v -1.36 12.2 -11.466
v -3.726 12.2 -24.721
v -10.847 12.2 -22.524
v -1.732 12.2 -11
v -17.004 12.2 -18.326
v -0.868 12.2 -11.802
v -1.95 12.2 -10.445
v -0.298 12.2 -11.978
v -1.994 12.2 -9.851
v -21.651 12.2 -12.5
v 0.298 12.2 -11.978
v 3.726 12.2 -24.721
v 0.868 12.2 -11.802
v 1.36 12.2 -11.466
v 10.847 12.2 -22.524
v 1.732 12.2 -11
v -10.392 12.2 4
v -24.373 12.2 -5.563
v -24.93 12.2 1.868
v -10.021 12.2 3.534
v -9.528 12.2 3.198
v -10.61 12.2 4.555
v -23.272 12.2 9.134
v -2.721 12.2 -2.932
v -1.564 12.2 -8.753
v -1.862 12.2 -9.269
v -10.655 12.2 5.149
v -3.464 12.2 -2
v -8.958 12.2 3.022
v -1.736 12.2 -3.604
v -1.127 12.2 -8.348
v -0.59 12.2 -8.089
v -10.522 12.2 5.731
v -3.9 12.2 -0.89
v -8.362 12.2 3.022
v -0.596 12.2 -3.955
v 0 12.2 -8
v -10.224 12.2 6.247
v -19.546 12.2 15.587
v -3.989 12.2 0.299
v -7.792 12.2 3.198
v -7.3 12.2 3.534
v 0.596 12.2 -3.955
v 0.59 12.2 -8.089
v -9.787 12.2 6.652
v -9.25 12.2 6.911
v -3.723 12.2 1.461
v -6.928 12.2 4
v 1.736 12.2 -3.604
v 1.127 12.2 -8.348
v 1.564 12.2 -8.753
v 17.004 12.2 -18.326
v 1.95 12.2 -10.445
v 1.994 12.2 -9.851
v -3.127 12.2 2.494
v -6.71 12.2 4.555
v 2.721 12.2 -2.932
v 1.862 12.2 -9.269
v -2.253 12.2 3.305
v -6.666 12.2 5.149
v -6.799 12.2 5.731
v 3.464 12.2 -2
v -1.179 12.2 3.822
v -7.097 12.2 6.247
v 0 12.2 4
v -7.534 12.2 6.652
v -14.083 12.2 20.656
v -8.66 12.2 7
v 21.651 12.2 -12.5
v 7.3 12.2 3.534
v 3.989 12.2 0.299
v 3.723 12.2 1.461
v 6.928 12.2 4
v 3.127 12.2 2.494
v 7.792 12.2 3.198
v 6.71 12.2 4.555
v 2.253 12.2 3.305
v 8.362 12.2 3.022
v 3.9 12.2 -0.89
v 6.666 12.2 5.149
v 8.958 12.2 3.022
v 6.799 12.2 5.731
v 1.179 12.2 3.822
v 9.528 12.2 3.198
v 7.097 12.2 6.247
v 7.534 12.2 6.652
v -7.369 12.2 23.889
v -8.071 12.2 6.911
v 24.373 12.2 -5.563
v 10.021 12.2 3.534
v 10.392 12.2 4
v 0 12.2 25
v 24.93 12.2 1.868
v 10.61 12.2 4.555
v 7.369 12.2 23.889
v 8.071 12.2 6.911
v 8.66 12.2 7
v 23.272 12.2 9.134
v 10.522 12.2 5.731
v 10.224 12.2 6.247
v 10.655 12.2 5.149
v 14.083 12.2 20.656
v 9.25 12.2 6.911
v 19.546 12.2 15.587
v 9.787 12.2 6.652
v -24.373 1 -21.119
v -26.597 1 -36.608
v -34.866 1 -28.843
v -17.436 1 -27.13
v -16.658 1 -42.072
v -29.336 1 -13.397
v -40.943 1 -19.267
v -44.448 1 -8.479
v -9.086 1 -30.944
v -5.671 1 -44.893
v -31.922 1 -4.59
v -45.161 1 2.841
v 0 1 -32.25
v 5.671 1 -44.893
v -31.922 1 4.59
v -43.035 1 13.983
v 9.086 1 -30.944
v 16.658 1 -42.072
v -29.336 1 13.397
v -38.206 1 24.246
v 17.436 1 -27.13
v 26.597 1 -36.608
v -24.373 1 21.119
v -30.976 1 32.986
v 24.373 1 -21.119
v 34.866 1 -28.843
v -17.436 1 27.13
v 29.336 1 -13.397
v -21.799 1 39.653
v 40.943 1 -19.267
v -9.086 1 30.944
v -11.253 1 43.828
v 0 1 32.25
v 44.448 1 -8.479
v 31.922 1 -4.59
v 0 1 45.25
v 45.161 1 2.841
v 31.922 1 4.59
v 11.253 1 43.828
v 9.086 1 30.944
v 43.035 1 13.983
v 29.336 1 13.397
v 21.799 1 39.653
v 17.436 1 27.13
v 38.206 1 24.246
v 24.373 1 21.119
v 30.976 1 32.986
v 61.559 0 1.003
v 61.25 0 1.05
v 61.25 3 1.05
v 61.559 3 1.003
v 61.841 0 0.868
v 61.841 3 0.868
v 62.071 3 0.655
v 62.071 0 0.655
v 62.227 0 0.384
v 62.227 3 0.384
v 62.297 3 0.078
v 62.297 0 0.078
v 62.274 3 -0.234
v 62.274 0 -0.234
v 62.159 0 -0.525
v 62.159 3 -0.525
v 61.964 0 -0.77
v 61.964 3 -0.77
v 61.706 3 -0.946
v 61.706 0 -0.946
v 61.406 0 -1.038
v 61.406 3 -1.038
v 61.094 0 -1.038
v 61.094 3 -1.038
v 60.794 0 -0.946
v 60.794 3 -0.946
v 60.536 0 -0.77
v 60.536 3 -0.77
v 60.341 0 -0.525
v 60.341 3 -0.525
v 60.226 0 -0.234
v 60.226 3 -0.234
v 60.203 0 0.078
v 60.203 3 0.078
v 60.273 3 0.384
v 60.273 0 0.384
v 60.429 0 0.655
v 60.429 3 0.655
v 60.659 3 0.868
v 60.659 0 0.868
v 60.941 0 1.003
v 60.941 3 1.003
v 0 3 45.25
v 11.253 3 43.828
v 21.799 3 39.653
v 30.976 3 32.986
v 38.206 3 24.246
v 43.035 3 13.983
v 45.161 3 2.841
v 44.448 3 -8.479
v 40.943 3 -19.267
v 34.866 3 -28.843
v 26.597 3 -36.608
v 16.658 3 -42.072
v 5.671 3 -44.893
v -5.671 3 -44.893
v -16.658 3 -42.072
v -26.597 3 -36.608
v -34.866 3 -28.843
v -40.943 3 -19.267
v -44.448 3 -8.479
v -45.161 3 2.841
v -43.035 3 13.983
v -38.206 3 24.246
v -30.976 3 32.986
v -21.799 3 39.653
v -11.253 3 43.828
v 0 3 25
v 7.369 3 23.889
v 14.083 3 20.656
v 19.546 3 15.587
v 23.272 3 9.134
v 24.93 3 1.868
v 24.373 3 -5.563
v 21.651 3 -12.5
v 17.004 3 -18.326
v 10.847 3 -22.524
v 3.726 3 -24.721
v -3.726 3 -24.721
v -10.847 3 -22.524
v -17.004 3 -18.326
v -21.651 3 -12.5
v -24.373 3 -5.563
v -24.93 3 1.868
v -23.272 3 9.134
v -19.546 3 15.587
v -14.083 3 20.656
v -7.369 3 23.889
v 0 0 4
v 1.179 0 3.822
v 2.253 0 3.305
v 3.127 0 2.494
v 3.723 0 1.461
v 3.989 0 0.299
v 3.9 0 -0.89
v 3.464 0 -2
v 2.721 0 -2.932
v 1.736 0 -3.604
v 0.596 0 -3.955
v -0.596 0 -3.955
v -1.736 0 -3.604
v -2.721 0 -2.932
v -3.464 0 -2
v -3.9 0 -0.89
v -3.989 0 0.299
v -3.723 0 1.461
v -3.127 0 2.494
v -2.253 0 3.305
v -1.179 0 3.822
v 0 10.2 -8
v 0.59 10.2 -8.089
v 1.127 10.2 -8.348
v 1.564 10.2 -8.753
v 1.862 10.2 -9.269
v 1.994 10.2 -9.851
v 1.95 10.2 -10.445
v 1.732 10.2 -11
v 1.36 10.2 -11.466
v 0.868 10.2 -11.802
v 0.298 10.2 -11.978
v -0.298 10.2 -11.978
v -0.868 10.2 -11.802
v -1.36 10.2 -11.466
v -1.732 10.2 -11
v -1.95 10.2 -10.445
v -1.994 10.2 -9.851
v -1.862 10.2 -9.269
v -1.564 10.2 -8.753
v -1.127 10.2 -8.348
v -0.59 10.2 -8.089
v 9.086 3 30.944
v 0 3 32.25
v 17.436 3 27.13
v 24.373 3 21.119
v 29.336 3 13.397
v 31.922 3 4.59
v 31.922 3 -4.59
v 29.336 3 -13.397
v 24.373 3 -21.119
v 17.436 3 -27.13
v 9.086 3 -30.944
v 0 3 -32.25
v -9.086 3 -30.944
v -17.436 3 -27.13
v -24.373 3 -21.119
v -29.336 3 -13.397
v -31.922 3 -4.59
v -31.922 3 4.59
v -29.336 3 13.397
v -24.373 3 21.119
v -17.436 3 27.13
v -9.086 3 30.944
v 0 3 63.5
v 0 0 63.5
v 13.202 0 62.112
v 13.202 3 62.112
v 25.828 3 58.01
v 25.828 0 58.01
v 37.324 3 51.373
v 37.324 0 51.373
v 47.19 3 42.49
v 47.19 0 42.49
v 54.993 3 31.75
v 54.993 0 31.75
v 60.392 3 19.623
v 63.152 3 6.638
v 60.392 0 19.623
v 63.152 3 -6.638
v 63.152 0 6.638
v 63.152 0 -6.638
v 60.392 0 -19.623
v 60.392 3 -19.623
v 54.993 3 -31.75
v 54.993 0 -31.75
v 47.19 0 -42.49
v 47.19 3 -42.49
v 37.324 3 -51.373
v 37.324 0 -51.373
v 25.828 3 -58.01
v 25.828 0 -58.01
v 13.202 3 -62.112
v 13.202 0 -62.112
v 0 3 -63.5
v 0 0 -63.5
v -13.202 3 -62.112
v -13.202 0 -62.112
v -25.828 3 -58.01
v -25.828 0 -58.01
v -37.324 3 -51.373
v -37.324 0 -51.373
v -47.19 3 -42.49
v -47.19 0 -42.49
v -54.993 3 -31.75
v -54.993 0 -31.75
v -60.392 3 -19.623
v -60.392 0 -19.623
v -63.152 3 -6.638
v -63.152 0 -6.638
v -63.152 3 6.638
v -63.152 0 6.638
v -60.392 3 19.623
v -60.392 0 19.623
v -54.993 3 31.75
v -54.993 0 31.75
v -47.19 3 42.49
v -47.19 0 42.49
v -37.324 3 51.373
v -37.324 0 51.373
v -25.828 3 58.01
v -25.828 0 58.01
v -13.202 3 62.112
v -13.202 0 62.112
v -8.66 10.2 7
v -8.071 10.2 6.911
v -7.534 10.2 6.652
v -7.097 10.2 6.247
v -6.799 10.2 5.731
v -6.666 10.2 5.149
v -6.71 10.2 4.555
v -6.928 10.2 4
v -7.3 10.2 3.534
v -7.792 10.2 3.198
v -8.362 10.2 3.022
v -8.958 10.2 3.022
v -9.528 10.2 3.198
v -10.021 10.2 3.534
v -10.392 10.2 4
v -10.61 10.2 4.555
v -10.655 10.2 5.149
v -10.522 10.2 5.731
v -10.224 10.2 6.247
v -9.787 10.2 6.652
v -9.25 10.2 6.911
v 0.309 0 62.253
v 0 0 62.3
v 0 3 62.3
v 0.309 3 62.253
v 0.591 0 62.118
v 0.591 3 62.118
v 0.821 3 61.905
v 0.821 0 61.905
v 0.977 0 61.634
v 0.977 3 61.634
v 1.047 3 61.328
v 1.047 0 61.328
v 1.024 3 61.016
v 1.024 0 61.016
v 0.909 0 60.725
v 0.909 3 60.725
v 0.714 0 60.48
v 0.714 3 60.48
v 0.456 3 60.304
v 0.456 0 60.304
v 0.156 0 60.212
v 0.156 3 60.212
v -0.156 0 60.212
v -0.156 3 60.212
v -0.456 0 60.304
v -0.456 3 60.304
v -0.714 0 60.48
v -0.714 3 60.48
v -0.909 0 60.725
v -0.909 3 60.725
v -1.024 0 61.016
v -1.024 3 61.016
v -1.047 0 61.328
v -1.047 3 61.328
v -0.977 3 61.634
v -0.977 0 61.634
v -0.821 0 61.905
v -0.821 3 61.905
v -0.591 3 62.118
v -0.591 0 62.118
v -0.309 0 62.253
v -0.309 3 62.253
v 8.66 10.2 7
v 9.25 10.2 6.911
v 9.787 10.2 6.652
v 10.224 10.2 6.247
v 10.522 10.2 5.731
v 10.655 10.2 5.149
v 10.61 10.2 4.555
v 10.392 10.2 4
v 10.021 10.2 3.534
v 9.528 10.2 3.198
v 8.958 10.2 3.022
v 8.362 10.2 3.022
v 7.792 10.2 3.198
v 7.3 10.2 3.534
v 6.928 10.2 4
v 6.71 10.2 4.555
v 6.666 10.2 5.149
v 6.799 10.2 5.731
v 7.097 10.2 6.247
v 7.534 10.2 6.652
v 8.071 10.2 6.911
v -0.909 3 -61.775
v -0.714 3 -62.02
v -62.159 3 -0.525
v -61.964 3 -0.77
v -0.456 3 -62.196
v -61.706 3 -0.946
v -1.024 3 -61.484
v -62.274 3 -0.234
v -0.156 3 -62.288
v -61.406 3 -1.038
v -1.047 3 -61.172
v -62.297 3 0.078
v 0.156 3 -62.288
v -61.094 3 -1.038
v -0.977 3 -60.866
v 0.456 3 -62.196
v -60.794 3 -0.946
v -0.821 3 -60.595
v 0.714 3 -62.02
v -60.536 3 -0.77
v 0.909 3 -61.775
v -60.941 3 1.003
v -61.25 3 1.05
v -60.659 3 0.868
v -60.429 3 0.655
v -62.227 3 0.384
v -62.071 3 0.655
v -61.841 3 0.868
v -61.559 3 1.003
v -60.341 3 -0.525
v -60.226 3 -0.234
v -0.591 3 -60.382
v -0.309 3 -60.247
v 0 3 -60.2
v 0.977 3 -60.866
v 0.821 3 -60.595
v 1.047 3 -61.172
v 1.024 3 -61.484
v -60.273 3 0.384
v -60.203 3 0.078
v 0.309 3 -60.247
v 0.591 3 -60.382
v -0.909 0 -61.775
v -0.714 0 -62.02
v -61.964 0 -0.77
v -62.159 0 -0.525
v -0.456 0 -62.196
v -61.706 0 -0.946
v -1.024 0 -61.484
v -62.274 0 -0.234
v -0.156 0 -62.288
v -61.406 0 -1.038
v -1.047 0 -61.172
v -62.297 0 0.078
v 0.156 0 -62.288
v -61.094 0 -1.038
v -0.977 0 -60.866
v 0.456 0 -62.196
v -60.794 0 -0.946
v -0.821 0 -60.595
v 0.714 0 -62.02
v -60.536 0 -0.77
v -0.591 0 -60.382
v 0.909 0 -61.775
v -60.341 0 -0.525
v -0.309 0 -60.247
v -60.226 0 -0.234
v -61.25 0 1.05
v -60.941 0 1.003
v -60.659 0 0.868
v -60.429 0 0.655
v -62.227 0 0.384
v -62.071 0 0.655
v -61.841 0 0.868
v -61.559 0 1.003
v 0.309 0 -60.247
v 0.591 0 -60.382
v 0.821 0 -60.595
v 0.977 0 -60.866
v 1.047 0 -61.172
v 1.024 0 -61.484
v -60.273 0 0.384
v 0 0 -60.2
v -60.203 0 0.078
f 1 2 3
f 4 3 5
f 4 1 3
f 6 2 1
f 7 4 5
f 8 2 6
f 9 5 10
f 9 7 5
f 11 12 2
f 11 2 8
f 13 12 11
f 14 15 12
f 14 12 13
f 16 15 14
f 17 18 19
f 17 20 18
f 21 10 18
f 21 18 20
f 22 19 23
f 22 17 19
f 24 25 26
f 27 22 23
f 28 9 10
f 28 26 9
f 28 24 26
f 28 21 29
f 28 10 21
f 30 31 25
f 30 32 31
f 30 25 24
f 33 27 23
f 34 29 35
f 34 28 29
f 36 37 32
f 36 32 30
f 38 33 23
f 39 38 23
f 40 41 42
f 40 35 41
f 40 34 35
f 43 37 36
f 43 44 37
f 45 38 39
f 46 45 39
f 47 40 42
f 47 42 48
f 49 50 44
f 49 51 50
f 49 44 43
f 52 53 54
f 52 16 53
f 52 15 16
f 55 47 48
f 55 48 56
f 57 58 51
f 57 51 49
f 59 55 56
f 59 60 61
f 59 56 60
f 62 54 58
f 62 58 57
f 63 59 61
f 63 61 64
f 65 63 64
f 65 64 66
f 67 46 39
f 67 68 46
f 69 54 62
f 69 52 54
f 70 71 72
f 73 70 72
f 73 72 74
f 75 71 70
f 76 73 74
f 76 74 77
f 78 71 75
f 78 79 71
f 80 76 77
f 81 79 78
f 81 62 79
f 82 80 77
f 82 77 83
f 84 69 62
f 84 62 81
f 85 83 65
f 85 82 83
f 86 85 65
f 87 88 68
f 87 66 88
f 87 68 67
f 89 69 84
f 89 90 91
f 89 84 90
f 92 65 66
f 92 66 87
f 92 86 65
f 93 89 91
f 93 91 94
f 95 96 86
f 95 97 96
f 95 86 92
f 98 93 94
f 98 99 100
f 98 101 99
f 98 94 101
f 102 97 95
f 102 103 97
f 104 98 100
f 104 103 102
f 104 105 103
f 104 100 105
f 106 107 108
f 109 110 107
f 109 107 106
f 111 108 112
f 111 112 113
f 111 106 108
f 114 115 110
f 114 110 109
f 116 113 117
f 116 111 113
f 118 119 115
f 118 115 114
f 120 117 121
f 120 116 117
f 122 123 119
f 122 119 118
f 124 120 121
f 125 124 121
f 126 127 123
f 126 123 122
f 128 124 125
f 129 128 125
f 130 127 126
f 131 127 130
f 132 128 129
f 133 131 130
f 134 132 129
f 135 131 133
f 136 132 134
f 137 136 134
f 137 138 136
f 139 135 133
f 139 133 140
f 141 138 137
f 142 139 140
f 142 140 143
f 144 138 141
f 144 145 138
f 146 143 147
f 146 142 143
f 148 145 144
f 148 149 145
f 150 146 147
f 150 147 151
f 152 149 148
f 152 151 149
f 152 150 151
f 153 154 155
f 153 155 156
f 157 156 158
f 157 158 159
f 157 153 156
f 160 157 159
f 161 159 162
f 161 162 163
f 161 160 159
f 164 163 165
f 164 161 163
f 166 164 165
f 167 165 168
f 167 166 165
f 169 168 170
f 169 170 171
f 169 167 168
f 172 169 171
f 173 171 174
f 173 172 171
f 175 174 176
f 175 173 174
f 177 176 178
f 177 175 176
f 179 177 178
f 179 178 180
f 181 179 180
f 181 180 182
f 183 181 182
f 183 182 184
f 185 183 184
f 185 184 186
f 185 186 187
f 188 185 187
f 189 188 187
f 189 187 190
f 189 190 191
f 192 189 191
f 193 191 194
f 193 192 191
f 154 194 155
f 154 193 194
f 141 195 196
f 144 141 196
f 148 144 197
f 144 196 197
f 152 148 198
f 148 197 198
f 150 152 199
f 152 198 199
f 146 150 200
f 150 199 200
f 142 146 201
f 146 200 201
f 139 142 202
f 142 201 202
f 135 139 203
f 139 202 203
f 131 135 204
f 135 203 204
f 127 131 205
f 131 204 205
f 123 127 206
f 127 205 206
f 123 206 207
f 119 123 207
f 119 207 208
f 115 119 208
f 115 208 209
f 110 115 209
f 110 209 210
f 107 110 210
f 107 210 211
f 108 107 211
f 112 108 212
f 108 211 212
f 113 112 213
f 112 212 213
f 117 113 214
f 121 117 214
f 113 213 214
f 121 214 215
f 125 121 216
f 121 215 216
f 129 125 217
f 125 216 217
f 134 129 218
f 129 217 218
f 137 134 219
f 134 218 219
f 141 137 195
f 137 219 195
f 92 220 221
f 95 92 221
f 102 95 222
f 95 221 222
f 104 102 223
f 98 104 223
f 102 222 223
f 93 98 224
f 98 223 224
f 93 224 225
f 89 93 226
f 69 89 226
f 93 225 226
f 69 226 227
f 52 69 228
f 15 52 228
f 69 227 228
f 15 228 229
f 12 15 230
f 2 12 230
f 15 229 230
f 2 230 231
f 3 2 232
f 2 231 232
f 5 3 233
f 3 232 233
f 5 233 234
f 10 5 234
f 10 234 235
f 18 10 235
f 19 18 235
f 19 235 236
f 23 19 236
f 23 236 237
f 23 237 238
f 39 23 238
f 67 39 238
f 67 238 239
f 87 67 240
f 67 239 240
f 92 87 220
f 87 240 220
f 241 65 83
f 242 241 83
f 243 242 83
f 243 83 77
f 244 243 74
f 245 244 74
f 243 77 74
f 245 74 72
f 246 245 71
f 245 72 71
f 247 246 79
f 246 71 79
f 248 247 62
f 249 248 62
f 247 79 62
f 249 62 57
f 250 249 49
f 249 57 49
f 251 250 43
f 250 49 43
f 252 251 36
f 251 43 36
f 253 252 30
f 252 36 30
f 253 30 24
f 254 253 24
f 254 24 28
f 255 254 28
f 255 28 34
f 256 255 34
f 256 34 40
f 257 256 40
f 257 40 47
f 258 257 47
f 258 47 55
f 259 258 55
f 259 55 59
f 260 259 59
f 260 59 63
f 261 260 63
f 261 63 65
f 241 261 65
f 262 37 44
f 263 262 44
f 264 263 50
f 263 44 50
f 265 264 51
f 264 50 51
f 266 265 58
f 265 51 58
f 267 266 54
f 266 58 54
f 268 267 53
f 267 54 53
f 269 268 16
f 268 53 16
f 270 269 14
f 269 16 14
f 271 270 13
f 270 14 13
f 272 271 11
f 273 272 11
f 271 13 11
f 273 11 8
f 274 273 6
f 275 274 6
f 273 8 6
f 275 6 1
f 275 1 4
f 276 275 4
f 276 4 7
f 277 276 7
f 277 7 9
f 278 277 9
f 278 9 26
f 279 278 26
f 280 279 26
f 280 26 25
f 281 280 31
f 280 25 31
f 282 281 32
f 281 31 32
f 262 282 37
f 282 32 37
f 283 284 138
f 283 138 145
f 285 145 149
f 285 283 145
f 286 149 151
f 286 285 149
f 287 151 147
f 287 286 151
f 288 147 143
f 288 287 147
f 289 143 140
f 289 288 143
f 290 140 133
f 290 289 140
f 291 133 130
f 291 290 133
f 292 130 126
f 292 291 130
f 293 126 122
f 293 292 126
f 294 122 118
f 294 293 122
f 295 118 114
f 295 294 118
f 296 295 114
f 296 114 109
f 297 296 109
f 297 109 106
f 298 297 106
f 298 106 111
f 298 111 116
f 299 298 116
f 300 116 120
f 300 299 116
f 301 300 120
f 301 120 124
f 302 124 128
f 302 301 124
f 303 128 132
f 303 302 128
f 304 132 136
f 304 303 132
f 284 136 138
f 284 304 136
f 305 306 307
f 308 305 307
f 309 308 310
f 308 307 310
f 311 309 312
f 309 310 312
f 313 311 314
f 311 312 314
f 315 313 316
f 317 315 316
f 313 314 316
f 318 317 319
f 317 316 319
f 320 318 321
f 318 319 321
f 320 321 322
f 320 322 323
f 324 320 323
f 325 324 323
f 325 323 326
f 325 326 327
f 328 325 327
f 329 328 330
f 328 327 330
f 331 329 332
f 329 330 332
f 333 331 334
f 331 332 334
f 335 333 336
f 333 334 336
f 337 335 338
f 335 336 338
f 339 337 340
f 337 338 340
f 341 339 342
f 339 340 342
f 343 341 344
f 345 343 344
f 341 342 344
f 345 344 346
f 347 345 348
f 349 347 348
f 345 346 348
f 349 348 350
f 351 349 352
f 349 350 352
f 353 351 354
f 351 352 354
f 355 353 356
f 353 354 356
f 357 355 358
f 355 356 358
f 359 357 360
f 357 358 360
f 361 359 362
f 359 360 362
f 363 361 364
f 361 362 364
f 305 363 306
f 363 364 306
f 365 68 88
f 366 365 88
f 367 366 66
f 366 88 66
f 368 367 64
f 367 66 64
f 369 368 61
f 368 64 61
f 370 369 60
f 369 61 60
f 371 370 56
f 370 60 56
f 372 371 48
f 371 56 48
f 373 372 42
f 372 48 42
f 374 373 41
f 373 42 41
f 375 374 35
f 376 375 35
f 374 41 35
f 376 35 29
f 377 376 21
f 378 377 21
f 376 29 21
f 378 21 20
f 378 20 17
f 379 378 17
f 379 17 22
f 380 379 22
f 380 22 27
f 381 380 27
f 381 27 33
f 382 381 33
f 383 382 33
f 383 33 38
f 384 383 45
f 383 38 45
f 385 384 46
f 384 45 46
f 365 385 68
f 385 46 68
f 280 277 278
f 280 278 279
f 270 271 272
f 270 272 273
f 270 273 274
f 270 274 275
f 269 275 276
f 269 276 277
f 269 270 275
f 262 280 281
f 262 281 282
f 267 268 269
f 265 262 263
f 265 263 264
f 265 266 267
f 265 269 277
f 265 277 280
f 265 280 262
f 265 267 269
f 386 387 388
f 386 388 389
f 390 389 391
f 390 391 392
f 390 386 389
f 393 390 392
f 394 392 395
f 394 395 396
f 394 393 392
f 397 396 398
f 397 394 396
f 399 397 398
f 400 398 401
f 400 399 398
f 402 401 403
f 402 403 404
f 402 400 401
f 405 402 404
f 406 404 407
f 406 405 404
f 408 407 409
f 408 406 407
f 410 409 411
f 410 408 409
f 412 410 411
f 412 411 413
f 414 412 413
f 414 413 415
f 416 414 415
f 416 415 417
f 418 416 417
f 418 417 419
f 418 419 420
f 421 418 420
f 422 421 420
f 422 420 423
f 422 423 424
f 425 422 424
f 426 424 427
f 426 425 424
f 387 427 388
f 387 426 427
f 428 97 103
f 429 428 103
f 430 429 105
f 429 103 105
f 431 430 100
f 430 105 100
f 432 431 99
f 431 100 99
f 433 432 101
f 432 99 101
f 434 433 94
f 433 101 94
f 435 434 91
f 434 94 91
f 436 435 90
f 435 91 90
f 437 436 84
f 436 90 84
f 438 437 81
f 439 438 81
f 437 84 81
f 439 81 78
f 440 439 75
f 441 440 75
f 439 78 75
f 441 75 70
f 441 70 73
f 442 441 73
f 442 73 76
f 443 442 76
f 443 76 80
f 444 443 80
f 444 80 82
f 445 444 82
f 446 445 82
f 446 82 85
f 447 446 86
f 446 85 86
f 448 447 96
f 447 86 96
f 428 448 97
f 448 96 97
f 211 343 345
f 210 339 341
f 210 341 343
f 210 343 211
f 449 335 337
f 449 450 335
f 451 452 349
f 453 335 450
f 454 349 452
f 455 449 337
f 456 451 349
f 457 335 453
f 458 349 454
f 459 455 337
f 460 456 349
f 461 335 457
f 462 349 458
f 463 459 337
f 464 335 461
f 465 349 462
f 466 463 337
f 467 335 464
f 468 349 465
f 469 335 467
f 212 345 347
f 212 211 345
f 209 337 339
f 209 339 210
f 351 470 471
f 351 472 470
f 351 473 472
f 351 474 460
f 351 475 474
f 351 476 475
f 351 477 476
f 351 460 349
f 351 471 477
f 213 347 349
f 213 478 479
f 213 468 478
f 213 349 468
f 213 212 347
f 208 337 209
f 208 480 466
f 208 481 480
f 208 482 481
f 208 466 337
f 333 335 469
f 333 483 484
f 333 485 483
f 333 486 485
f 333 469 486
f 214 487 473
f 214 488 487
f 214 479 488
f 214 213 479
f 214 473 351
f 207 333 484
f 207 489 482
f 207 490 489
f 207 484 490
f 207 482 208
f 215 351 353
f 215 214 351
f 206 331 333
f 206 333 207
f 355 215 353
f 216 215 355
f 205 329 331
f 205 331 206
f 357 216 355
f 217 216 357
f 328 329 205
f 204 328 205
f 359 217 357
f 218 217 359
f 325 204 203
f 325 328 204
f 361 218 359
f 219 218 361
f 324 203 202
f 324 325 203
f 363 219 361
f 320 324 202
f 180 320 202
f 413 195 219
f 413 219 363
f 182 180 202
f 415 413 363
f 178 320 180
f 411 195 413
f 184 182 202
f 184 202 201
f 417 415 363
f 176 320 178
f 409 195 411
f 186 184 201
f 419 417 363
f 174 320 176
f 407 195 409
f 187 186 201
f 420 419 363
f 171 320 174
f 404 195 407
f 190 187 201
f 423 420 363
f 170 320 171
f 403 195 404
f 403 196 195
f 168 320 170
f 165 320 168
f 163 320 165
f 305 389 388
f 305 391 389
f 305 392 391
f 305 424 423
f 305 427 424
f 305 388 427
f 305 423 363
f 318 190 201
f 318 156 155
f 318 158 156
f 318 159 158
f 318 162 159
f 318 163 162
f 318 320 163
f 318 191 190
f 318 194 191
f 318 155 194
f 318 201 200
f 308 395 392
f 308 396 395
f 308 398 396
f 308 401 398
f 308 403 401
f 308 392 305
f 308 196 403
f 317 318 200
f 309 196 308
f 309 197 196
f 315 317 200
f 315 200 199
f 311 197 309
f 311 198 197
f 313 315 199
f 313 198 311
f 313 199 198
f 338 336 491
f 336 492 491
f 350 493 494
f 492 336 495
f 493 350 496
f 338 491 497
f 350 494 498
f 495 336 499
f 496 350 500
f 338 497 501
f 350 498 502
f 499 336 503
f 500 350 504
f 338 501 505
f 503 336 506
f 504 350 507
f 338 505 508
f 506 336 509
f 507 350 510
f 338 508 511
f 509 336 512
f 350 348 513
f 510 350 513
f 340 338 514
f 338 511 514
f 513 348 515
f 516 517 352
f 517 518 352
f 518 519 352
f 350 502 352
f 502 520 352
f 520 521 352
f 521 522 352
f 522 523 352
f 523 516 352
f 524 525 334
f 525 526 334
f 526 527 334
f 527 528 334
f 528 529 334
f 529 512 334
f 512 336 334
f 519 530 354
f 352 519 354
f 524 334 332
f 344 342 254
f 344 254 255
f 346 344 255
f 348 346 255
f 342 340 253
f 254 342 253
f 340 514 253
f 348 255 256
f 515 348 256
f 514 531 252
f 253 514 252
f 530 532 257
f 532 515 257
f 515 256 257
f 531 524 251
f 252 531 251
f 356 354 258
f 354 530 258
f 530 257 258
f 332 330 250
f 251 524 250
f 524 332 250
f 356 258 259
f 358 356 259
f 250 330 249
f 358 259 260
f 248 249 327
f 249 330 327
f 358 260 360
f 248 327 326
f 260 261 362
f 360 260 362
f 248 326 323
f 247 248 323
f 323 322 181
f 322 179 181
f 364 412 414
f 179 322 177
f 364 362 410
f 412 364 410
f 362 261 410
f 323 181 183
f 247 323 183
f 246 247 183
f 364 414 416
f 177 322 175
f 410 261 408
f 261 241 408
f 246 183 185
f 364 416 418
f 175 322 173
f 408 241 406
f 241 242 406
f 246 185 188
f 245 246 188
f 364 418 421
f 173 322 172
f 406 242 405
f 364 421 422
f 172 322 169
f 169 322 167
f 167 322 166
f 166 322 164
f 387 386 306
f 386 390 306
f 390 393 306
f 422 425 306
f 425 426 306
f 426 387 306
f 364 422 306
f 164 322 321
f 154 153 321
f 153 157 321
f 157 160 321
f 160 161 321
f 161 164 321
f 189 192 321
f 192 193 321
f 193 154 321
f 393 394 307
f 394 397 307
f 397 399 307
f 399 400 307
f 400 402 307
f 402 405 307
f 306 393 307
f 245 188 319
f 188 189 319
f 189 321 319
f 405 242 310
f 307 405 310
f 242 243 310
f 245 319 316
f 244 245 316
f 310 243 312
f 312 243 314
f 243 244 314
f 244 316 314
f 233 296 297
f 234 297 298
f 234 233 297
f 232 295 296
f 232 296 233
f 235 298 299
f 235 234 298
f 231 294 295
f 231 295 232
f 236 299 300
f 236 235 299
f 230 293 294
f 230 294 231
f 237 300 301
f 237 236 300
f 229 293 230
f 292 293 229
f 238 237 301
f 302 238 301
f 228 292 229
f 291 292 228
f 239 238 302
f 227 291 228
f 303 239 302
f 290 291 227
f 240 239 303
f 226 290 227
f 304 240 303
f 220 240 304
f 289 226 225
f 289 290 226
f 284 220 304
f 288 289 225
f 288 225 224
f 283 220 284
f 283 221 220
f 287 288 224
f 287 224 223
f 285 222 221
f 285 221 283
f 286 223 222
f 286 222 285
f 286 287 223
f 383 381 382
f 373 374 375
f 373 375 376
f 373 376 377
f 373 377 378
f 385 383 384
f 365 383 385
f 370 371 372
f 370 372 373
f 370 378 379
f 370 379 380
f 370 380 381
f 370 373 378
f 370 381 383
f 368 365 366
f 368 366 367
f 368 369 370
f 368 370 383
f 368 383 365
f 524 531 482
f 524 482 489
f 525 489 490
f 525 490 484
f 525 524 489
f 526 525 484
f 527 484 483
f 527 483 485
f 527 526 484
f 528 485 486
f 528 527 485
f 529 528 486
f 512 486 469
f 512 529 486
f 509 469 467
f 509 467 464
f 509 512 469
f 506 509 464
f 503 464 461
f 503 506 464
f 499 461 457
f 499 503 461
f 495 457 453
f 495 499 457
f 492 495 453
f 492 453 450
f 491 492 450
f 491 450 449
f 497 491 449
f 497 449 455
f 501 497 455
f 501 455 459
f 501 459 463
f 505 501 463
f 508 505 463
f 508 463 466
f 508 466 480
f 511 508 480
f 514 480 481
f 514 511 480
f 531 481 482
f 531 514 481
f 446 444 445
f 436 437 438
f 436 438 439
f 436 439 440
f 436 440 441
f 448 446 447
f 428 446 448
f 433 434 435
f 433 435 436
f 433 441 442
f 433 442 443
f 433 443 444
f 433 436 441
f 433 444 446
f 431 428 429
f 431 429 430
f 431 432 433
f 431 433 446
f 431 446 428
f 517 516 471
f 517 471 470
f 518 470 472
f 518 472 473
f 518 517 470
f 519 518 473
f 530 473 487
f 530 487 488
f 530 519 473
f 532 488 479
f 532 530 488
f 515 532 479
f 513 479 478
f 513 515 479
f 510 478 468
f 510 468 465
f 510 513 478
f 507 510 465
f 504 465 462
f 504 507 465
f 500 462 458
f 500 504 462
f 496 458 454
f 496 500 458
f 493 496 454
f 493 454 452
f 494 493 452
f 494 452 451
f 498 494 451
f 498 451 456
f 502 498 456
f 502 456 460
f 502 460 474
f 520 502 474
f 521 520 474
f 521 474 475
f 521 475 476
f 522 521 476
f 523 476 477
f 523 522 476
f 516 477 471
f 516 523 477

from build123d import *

# Parameters (mm, degrees)
SKETCH1_R           = 63.5
SKETCH1_R_2         = 1.05
BOSS_EXTRUDE1_DEPTH = 3
SKETCH2_R           = 45.25
SKETCH2_R_2         = 32.25
CUT_EXTRUDE1_DEPTH  = 2
SKETCH4_R           = 25
BOSS_EXTRUDE2_DEPTH = 9.2
SKETCH5_R           = 2
CUT_EXTRUDE2_DEPTH  = 2
SKETCH6_R           = 4
CUT_EXTRUDE3_DEPTH  = 91.627479276


with BuildPart() as part:
    # Sketch1 → Boss-Extrude1 (new body)
    with BuildSketch(Plane(origin=(0, 0, 0), x_dir=(1, 0, 0), z_dir=(0, 1, 0))):
        with Locations(Location((0, 0, 0), (0, 0, 270))):
            Circle(SKETCH1_R)
        with Locations(Location((0, 61.25, 0), (0, 0, 270))):
            Circle(SKETCH1_R_2, mode=Mode.SUBTRACT)
        with Locations(Location((61.25, 0, 0), (0, 0, 270))):
            Circle(SKETCH1_R_2, mode=Mode.SUBTRACT)
        with Locations(Location((0, -61.25, 0), (0, 0, 270))):
            Circle(SKETCH1_R_2, mode=Mode.SUBTRACT)
        with Locations(Location((-61.25, 0, 0), (0, 0, 270))):
            Circle(SKETCH1_R_2, mode=Mode.SUBTRACT)
    extrude(amount=BOSS_EXTRUDE1_DEPTH)

    # Sketch2 → Cut-Extrude1 (cut)
    with BuildSketch(Plane(origin=(0, 3, 0), x_dir=(1, 0, 0), z_dir=(0, 1, 0))):
        with Locations(Location((0, 0, 0), (0, 0, 270))):
            Circle(SKETCH2_R)
        with Locations(Location((0, 0, 0), (0, 0, 270))):
            Circle(SKETCH2_R_2, mode=Mode.SUBTRACT)
    extrude(amount=-CUT_EXTRUDE1_DEPTH, mode=Mode.SUBTRACT)

    # Sketch4 → Boss-Extrude2 (add)
    with BuildSketch(Plane(origin=(0, 3, 0), x_dir=(1, 0, 0), z_dir=(0, 1, 0))):
        with Locations(Location((0, 0, 0), (0, 0, 270))):
            Circle(SKETCH4_R)
    extrude(amount=BOSS_EXTRUDE2_DEPTH)

    # Sketch5 → Cut-Extrude2 (cut)
    with BuildSketch(Plane(origin=(0, 12.2, 0), x_dir=(1, 0, 0), z_dir=(0, 1, 0))):
        with Locations(Location((0, 10, 0), (0, 0, 270))):
            Circle(SKETCH5_R)
        with Locations(Location((8.660254038, -5, 0), (0, 0, 270))):
            Circle(SKETCH5_R)
        with Locations(Location((-8.660254038, -5, 0), (0, 0, 270))):
            Circle(SKETCH5_R)
    extrude(amount=-CUT_EXTRUDE2_DEPTH, mode=Mode.SUBTRACT)

    # Sketch6 → Cut-Extrude3 (cut, through all)
    with BuildSketch(Plane(origin=(0, 12.2, 0), x_dir=(1, 0, 0), z_dir=(0, 1, 0))):
        with Locations(Location((0, 0, 0), (0, 0, 270))):
            Circle(SKETCH6_R)
    extrude(amount=-CUT_EXTRUDE3_DEPTH, mode=Mode.SUBTRACT)


solid = part.part
